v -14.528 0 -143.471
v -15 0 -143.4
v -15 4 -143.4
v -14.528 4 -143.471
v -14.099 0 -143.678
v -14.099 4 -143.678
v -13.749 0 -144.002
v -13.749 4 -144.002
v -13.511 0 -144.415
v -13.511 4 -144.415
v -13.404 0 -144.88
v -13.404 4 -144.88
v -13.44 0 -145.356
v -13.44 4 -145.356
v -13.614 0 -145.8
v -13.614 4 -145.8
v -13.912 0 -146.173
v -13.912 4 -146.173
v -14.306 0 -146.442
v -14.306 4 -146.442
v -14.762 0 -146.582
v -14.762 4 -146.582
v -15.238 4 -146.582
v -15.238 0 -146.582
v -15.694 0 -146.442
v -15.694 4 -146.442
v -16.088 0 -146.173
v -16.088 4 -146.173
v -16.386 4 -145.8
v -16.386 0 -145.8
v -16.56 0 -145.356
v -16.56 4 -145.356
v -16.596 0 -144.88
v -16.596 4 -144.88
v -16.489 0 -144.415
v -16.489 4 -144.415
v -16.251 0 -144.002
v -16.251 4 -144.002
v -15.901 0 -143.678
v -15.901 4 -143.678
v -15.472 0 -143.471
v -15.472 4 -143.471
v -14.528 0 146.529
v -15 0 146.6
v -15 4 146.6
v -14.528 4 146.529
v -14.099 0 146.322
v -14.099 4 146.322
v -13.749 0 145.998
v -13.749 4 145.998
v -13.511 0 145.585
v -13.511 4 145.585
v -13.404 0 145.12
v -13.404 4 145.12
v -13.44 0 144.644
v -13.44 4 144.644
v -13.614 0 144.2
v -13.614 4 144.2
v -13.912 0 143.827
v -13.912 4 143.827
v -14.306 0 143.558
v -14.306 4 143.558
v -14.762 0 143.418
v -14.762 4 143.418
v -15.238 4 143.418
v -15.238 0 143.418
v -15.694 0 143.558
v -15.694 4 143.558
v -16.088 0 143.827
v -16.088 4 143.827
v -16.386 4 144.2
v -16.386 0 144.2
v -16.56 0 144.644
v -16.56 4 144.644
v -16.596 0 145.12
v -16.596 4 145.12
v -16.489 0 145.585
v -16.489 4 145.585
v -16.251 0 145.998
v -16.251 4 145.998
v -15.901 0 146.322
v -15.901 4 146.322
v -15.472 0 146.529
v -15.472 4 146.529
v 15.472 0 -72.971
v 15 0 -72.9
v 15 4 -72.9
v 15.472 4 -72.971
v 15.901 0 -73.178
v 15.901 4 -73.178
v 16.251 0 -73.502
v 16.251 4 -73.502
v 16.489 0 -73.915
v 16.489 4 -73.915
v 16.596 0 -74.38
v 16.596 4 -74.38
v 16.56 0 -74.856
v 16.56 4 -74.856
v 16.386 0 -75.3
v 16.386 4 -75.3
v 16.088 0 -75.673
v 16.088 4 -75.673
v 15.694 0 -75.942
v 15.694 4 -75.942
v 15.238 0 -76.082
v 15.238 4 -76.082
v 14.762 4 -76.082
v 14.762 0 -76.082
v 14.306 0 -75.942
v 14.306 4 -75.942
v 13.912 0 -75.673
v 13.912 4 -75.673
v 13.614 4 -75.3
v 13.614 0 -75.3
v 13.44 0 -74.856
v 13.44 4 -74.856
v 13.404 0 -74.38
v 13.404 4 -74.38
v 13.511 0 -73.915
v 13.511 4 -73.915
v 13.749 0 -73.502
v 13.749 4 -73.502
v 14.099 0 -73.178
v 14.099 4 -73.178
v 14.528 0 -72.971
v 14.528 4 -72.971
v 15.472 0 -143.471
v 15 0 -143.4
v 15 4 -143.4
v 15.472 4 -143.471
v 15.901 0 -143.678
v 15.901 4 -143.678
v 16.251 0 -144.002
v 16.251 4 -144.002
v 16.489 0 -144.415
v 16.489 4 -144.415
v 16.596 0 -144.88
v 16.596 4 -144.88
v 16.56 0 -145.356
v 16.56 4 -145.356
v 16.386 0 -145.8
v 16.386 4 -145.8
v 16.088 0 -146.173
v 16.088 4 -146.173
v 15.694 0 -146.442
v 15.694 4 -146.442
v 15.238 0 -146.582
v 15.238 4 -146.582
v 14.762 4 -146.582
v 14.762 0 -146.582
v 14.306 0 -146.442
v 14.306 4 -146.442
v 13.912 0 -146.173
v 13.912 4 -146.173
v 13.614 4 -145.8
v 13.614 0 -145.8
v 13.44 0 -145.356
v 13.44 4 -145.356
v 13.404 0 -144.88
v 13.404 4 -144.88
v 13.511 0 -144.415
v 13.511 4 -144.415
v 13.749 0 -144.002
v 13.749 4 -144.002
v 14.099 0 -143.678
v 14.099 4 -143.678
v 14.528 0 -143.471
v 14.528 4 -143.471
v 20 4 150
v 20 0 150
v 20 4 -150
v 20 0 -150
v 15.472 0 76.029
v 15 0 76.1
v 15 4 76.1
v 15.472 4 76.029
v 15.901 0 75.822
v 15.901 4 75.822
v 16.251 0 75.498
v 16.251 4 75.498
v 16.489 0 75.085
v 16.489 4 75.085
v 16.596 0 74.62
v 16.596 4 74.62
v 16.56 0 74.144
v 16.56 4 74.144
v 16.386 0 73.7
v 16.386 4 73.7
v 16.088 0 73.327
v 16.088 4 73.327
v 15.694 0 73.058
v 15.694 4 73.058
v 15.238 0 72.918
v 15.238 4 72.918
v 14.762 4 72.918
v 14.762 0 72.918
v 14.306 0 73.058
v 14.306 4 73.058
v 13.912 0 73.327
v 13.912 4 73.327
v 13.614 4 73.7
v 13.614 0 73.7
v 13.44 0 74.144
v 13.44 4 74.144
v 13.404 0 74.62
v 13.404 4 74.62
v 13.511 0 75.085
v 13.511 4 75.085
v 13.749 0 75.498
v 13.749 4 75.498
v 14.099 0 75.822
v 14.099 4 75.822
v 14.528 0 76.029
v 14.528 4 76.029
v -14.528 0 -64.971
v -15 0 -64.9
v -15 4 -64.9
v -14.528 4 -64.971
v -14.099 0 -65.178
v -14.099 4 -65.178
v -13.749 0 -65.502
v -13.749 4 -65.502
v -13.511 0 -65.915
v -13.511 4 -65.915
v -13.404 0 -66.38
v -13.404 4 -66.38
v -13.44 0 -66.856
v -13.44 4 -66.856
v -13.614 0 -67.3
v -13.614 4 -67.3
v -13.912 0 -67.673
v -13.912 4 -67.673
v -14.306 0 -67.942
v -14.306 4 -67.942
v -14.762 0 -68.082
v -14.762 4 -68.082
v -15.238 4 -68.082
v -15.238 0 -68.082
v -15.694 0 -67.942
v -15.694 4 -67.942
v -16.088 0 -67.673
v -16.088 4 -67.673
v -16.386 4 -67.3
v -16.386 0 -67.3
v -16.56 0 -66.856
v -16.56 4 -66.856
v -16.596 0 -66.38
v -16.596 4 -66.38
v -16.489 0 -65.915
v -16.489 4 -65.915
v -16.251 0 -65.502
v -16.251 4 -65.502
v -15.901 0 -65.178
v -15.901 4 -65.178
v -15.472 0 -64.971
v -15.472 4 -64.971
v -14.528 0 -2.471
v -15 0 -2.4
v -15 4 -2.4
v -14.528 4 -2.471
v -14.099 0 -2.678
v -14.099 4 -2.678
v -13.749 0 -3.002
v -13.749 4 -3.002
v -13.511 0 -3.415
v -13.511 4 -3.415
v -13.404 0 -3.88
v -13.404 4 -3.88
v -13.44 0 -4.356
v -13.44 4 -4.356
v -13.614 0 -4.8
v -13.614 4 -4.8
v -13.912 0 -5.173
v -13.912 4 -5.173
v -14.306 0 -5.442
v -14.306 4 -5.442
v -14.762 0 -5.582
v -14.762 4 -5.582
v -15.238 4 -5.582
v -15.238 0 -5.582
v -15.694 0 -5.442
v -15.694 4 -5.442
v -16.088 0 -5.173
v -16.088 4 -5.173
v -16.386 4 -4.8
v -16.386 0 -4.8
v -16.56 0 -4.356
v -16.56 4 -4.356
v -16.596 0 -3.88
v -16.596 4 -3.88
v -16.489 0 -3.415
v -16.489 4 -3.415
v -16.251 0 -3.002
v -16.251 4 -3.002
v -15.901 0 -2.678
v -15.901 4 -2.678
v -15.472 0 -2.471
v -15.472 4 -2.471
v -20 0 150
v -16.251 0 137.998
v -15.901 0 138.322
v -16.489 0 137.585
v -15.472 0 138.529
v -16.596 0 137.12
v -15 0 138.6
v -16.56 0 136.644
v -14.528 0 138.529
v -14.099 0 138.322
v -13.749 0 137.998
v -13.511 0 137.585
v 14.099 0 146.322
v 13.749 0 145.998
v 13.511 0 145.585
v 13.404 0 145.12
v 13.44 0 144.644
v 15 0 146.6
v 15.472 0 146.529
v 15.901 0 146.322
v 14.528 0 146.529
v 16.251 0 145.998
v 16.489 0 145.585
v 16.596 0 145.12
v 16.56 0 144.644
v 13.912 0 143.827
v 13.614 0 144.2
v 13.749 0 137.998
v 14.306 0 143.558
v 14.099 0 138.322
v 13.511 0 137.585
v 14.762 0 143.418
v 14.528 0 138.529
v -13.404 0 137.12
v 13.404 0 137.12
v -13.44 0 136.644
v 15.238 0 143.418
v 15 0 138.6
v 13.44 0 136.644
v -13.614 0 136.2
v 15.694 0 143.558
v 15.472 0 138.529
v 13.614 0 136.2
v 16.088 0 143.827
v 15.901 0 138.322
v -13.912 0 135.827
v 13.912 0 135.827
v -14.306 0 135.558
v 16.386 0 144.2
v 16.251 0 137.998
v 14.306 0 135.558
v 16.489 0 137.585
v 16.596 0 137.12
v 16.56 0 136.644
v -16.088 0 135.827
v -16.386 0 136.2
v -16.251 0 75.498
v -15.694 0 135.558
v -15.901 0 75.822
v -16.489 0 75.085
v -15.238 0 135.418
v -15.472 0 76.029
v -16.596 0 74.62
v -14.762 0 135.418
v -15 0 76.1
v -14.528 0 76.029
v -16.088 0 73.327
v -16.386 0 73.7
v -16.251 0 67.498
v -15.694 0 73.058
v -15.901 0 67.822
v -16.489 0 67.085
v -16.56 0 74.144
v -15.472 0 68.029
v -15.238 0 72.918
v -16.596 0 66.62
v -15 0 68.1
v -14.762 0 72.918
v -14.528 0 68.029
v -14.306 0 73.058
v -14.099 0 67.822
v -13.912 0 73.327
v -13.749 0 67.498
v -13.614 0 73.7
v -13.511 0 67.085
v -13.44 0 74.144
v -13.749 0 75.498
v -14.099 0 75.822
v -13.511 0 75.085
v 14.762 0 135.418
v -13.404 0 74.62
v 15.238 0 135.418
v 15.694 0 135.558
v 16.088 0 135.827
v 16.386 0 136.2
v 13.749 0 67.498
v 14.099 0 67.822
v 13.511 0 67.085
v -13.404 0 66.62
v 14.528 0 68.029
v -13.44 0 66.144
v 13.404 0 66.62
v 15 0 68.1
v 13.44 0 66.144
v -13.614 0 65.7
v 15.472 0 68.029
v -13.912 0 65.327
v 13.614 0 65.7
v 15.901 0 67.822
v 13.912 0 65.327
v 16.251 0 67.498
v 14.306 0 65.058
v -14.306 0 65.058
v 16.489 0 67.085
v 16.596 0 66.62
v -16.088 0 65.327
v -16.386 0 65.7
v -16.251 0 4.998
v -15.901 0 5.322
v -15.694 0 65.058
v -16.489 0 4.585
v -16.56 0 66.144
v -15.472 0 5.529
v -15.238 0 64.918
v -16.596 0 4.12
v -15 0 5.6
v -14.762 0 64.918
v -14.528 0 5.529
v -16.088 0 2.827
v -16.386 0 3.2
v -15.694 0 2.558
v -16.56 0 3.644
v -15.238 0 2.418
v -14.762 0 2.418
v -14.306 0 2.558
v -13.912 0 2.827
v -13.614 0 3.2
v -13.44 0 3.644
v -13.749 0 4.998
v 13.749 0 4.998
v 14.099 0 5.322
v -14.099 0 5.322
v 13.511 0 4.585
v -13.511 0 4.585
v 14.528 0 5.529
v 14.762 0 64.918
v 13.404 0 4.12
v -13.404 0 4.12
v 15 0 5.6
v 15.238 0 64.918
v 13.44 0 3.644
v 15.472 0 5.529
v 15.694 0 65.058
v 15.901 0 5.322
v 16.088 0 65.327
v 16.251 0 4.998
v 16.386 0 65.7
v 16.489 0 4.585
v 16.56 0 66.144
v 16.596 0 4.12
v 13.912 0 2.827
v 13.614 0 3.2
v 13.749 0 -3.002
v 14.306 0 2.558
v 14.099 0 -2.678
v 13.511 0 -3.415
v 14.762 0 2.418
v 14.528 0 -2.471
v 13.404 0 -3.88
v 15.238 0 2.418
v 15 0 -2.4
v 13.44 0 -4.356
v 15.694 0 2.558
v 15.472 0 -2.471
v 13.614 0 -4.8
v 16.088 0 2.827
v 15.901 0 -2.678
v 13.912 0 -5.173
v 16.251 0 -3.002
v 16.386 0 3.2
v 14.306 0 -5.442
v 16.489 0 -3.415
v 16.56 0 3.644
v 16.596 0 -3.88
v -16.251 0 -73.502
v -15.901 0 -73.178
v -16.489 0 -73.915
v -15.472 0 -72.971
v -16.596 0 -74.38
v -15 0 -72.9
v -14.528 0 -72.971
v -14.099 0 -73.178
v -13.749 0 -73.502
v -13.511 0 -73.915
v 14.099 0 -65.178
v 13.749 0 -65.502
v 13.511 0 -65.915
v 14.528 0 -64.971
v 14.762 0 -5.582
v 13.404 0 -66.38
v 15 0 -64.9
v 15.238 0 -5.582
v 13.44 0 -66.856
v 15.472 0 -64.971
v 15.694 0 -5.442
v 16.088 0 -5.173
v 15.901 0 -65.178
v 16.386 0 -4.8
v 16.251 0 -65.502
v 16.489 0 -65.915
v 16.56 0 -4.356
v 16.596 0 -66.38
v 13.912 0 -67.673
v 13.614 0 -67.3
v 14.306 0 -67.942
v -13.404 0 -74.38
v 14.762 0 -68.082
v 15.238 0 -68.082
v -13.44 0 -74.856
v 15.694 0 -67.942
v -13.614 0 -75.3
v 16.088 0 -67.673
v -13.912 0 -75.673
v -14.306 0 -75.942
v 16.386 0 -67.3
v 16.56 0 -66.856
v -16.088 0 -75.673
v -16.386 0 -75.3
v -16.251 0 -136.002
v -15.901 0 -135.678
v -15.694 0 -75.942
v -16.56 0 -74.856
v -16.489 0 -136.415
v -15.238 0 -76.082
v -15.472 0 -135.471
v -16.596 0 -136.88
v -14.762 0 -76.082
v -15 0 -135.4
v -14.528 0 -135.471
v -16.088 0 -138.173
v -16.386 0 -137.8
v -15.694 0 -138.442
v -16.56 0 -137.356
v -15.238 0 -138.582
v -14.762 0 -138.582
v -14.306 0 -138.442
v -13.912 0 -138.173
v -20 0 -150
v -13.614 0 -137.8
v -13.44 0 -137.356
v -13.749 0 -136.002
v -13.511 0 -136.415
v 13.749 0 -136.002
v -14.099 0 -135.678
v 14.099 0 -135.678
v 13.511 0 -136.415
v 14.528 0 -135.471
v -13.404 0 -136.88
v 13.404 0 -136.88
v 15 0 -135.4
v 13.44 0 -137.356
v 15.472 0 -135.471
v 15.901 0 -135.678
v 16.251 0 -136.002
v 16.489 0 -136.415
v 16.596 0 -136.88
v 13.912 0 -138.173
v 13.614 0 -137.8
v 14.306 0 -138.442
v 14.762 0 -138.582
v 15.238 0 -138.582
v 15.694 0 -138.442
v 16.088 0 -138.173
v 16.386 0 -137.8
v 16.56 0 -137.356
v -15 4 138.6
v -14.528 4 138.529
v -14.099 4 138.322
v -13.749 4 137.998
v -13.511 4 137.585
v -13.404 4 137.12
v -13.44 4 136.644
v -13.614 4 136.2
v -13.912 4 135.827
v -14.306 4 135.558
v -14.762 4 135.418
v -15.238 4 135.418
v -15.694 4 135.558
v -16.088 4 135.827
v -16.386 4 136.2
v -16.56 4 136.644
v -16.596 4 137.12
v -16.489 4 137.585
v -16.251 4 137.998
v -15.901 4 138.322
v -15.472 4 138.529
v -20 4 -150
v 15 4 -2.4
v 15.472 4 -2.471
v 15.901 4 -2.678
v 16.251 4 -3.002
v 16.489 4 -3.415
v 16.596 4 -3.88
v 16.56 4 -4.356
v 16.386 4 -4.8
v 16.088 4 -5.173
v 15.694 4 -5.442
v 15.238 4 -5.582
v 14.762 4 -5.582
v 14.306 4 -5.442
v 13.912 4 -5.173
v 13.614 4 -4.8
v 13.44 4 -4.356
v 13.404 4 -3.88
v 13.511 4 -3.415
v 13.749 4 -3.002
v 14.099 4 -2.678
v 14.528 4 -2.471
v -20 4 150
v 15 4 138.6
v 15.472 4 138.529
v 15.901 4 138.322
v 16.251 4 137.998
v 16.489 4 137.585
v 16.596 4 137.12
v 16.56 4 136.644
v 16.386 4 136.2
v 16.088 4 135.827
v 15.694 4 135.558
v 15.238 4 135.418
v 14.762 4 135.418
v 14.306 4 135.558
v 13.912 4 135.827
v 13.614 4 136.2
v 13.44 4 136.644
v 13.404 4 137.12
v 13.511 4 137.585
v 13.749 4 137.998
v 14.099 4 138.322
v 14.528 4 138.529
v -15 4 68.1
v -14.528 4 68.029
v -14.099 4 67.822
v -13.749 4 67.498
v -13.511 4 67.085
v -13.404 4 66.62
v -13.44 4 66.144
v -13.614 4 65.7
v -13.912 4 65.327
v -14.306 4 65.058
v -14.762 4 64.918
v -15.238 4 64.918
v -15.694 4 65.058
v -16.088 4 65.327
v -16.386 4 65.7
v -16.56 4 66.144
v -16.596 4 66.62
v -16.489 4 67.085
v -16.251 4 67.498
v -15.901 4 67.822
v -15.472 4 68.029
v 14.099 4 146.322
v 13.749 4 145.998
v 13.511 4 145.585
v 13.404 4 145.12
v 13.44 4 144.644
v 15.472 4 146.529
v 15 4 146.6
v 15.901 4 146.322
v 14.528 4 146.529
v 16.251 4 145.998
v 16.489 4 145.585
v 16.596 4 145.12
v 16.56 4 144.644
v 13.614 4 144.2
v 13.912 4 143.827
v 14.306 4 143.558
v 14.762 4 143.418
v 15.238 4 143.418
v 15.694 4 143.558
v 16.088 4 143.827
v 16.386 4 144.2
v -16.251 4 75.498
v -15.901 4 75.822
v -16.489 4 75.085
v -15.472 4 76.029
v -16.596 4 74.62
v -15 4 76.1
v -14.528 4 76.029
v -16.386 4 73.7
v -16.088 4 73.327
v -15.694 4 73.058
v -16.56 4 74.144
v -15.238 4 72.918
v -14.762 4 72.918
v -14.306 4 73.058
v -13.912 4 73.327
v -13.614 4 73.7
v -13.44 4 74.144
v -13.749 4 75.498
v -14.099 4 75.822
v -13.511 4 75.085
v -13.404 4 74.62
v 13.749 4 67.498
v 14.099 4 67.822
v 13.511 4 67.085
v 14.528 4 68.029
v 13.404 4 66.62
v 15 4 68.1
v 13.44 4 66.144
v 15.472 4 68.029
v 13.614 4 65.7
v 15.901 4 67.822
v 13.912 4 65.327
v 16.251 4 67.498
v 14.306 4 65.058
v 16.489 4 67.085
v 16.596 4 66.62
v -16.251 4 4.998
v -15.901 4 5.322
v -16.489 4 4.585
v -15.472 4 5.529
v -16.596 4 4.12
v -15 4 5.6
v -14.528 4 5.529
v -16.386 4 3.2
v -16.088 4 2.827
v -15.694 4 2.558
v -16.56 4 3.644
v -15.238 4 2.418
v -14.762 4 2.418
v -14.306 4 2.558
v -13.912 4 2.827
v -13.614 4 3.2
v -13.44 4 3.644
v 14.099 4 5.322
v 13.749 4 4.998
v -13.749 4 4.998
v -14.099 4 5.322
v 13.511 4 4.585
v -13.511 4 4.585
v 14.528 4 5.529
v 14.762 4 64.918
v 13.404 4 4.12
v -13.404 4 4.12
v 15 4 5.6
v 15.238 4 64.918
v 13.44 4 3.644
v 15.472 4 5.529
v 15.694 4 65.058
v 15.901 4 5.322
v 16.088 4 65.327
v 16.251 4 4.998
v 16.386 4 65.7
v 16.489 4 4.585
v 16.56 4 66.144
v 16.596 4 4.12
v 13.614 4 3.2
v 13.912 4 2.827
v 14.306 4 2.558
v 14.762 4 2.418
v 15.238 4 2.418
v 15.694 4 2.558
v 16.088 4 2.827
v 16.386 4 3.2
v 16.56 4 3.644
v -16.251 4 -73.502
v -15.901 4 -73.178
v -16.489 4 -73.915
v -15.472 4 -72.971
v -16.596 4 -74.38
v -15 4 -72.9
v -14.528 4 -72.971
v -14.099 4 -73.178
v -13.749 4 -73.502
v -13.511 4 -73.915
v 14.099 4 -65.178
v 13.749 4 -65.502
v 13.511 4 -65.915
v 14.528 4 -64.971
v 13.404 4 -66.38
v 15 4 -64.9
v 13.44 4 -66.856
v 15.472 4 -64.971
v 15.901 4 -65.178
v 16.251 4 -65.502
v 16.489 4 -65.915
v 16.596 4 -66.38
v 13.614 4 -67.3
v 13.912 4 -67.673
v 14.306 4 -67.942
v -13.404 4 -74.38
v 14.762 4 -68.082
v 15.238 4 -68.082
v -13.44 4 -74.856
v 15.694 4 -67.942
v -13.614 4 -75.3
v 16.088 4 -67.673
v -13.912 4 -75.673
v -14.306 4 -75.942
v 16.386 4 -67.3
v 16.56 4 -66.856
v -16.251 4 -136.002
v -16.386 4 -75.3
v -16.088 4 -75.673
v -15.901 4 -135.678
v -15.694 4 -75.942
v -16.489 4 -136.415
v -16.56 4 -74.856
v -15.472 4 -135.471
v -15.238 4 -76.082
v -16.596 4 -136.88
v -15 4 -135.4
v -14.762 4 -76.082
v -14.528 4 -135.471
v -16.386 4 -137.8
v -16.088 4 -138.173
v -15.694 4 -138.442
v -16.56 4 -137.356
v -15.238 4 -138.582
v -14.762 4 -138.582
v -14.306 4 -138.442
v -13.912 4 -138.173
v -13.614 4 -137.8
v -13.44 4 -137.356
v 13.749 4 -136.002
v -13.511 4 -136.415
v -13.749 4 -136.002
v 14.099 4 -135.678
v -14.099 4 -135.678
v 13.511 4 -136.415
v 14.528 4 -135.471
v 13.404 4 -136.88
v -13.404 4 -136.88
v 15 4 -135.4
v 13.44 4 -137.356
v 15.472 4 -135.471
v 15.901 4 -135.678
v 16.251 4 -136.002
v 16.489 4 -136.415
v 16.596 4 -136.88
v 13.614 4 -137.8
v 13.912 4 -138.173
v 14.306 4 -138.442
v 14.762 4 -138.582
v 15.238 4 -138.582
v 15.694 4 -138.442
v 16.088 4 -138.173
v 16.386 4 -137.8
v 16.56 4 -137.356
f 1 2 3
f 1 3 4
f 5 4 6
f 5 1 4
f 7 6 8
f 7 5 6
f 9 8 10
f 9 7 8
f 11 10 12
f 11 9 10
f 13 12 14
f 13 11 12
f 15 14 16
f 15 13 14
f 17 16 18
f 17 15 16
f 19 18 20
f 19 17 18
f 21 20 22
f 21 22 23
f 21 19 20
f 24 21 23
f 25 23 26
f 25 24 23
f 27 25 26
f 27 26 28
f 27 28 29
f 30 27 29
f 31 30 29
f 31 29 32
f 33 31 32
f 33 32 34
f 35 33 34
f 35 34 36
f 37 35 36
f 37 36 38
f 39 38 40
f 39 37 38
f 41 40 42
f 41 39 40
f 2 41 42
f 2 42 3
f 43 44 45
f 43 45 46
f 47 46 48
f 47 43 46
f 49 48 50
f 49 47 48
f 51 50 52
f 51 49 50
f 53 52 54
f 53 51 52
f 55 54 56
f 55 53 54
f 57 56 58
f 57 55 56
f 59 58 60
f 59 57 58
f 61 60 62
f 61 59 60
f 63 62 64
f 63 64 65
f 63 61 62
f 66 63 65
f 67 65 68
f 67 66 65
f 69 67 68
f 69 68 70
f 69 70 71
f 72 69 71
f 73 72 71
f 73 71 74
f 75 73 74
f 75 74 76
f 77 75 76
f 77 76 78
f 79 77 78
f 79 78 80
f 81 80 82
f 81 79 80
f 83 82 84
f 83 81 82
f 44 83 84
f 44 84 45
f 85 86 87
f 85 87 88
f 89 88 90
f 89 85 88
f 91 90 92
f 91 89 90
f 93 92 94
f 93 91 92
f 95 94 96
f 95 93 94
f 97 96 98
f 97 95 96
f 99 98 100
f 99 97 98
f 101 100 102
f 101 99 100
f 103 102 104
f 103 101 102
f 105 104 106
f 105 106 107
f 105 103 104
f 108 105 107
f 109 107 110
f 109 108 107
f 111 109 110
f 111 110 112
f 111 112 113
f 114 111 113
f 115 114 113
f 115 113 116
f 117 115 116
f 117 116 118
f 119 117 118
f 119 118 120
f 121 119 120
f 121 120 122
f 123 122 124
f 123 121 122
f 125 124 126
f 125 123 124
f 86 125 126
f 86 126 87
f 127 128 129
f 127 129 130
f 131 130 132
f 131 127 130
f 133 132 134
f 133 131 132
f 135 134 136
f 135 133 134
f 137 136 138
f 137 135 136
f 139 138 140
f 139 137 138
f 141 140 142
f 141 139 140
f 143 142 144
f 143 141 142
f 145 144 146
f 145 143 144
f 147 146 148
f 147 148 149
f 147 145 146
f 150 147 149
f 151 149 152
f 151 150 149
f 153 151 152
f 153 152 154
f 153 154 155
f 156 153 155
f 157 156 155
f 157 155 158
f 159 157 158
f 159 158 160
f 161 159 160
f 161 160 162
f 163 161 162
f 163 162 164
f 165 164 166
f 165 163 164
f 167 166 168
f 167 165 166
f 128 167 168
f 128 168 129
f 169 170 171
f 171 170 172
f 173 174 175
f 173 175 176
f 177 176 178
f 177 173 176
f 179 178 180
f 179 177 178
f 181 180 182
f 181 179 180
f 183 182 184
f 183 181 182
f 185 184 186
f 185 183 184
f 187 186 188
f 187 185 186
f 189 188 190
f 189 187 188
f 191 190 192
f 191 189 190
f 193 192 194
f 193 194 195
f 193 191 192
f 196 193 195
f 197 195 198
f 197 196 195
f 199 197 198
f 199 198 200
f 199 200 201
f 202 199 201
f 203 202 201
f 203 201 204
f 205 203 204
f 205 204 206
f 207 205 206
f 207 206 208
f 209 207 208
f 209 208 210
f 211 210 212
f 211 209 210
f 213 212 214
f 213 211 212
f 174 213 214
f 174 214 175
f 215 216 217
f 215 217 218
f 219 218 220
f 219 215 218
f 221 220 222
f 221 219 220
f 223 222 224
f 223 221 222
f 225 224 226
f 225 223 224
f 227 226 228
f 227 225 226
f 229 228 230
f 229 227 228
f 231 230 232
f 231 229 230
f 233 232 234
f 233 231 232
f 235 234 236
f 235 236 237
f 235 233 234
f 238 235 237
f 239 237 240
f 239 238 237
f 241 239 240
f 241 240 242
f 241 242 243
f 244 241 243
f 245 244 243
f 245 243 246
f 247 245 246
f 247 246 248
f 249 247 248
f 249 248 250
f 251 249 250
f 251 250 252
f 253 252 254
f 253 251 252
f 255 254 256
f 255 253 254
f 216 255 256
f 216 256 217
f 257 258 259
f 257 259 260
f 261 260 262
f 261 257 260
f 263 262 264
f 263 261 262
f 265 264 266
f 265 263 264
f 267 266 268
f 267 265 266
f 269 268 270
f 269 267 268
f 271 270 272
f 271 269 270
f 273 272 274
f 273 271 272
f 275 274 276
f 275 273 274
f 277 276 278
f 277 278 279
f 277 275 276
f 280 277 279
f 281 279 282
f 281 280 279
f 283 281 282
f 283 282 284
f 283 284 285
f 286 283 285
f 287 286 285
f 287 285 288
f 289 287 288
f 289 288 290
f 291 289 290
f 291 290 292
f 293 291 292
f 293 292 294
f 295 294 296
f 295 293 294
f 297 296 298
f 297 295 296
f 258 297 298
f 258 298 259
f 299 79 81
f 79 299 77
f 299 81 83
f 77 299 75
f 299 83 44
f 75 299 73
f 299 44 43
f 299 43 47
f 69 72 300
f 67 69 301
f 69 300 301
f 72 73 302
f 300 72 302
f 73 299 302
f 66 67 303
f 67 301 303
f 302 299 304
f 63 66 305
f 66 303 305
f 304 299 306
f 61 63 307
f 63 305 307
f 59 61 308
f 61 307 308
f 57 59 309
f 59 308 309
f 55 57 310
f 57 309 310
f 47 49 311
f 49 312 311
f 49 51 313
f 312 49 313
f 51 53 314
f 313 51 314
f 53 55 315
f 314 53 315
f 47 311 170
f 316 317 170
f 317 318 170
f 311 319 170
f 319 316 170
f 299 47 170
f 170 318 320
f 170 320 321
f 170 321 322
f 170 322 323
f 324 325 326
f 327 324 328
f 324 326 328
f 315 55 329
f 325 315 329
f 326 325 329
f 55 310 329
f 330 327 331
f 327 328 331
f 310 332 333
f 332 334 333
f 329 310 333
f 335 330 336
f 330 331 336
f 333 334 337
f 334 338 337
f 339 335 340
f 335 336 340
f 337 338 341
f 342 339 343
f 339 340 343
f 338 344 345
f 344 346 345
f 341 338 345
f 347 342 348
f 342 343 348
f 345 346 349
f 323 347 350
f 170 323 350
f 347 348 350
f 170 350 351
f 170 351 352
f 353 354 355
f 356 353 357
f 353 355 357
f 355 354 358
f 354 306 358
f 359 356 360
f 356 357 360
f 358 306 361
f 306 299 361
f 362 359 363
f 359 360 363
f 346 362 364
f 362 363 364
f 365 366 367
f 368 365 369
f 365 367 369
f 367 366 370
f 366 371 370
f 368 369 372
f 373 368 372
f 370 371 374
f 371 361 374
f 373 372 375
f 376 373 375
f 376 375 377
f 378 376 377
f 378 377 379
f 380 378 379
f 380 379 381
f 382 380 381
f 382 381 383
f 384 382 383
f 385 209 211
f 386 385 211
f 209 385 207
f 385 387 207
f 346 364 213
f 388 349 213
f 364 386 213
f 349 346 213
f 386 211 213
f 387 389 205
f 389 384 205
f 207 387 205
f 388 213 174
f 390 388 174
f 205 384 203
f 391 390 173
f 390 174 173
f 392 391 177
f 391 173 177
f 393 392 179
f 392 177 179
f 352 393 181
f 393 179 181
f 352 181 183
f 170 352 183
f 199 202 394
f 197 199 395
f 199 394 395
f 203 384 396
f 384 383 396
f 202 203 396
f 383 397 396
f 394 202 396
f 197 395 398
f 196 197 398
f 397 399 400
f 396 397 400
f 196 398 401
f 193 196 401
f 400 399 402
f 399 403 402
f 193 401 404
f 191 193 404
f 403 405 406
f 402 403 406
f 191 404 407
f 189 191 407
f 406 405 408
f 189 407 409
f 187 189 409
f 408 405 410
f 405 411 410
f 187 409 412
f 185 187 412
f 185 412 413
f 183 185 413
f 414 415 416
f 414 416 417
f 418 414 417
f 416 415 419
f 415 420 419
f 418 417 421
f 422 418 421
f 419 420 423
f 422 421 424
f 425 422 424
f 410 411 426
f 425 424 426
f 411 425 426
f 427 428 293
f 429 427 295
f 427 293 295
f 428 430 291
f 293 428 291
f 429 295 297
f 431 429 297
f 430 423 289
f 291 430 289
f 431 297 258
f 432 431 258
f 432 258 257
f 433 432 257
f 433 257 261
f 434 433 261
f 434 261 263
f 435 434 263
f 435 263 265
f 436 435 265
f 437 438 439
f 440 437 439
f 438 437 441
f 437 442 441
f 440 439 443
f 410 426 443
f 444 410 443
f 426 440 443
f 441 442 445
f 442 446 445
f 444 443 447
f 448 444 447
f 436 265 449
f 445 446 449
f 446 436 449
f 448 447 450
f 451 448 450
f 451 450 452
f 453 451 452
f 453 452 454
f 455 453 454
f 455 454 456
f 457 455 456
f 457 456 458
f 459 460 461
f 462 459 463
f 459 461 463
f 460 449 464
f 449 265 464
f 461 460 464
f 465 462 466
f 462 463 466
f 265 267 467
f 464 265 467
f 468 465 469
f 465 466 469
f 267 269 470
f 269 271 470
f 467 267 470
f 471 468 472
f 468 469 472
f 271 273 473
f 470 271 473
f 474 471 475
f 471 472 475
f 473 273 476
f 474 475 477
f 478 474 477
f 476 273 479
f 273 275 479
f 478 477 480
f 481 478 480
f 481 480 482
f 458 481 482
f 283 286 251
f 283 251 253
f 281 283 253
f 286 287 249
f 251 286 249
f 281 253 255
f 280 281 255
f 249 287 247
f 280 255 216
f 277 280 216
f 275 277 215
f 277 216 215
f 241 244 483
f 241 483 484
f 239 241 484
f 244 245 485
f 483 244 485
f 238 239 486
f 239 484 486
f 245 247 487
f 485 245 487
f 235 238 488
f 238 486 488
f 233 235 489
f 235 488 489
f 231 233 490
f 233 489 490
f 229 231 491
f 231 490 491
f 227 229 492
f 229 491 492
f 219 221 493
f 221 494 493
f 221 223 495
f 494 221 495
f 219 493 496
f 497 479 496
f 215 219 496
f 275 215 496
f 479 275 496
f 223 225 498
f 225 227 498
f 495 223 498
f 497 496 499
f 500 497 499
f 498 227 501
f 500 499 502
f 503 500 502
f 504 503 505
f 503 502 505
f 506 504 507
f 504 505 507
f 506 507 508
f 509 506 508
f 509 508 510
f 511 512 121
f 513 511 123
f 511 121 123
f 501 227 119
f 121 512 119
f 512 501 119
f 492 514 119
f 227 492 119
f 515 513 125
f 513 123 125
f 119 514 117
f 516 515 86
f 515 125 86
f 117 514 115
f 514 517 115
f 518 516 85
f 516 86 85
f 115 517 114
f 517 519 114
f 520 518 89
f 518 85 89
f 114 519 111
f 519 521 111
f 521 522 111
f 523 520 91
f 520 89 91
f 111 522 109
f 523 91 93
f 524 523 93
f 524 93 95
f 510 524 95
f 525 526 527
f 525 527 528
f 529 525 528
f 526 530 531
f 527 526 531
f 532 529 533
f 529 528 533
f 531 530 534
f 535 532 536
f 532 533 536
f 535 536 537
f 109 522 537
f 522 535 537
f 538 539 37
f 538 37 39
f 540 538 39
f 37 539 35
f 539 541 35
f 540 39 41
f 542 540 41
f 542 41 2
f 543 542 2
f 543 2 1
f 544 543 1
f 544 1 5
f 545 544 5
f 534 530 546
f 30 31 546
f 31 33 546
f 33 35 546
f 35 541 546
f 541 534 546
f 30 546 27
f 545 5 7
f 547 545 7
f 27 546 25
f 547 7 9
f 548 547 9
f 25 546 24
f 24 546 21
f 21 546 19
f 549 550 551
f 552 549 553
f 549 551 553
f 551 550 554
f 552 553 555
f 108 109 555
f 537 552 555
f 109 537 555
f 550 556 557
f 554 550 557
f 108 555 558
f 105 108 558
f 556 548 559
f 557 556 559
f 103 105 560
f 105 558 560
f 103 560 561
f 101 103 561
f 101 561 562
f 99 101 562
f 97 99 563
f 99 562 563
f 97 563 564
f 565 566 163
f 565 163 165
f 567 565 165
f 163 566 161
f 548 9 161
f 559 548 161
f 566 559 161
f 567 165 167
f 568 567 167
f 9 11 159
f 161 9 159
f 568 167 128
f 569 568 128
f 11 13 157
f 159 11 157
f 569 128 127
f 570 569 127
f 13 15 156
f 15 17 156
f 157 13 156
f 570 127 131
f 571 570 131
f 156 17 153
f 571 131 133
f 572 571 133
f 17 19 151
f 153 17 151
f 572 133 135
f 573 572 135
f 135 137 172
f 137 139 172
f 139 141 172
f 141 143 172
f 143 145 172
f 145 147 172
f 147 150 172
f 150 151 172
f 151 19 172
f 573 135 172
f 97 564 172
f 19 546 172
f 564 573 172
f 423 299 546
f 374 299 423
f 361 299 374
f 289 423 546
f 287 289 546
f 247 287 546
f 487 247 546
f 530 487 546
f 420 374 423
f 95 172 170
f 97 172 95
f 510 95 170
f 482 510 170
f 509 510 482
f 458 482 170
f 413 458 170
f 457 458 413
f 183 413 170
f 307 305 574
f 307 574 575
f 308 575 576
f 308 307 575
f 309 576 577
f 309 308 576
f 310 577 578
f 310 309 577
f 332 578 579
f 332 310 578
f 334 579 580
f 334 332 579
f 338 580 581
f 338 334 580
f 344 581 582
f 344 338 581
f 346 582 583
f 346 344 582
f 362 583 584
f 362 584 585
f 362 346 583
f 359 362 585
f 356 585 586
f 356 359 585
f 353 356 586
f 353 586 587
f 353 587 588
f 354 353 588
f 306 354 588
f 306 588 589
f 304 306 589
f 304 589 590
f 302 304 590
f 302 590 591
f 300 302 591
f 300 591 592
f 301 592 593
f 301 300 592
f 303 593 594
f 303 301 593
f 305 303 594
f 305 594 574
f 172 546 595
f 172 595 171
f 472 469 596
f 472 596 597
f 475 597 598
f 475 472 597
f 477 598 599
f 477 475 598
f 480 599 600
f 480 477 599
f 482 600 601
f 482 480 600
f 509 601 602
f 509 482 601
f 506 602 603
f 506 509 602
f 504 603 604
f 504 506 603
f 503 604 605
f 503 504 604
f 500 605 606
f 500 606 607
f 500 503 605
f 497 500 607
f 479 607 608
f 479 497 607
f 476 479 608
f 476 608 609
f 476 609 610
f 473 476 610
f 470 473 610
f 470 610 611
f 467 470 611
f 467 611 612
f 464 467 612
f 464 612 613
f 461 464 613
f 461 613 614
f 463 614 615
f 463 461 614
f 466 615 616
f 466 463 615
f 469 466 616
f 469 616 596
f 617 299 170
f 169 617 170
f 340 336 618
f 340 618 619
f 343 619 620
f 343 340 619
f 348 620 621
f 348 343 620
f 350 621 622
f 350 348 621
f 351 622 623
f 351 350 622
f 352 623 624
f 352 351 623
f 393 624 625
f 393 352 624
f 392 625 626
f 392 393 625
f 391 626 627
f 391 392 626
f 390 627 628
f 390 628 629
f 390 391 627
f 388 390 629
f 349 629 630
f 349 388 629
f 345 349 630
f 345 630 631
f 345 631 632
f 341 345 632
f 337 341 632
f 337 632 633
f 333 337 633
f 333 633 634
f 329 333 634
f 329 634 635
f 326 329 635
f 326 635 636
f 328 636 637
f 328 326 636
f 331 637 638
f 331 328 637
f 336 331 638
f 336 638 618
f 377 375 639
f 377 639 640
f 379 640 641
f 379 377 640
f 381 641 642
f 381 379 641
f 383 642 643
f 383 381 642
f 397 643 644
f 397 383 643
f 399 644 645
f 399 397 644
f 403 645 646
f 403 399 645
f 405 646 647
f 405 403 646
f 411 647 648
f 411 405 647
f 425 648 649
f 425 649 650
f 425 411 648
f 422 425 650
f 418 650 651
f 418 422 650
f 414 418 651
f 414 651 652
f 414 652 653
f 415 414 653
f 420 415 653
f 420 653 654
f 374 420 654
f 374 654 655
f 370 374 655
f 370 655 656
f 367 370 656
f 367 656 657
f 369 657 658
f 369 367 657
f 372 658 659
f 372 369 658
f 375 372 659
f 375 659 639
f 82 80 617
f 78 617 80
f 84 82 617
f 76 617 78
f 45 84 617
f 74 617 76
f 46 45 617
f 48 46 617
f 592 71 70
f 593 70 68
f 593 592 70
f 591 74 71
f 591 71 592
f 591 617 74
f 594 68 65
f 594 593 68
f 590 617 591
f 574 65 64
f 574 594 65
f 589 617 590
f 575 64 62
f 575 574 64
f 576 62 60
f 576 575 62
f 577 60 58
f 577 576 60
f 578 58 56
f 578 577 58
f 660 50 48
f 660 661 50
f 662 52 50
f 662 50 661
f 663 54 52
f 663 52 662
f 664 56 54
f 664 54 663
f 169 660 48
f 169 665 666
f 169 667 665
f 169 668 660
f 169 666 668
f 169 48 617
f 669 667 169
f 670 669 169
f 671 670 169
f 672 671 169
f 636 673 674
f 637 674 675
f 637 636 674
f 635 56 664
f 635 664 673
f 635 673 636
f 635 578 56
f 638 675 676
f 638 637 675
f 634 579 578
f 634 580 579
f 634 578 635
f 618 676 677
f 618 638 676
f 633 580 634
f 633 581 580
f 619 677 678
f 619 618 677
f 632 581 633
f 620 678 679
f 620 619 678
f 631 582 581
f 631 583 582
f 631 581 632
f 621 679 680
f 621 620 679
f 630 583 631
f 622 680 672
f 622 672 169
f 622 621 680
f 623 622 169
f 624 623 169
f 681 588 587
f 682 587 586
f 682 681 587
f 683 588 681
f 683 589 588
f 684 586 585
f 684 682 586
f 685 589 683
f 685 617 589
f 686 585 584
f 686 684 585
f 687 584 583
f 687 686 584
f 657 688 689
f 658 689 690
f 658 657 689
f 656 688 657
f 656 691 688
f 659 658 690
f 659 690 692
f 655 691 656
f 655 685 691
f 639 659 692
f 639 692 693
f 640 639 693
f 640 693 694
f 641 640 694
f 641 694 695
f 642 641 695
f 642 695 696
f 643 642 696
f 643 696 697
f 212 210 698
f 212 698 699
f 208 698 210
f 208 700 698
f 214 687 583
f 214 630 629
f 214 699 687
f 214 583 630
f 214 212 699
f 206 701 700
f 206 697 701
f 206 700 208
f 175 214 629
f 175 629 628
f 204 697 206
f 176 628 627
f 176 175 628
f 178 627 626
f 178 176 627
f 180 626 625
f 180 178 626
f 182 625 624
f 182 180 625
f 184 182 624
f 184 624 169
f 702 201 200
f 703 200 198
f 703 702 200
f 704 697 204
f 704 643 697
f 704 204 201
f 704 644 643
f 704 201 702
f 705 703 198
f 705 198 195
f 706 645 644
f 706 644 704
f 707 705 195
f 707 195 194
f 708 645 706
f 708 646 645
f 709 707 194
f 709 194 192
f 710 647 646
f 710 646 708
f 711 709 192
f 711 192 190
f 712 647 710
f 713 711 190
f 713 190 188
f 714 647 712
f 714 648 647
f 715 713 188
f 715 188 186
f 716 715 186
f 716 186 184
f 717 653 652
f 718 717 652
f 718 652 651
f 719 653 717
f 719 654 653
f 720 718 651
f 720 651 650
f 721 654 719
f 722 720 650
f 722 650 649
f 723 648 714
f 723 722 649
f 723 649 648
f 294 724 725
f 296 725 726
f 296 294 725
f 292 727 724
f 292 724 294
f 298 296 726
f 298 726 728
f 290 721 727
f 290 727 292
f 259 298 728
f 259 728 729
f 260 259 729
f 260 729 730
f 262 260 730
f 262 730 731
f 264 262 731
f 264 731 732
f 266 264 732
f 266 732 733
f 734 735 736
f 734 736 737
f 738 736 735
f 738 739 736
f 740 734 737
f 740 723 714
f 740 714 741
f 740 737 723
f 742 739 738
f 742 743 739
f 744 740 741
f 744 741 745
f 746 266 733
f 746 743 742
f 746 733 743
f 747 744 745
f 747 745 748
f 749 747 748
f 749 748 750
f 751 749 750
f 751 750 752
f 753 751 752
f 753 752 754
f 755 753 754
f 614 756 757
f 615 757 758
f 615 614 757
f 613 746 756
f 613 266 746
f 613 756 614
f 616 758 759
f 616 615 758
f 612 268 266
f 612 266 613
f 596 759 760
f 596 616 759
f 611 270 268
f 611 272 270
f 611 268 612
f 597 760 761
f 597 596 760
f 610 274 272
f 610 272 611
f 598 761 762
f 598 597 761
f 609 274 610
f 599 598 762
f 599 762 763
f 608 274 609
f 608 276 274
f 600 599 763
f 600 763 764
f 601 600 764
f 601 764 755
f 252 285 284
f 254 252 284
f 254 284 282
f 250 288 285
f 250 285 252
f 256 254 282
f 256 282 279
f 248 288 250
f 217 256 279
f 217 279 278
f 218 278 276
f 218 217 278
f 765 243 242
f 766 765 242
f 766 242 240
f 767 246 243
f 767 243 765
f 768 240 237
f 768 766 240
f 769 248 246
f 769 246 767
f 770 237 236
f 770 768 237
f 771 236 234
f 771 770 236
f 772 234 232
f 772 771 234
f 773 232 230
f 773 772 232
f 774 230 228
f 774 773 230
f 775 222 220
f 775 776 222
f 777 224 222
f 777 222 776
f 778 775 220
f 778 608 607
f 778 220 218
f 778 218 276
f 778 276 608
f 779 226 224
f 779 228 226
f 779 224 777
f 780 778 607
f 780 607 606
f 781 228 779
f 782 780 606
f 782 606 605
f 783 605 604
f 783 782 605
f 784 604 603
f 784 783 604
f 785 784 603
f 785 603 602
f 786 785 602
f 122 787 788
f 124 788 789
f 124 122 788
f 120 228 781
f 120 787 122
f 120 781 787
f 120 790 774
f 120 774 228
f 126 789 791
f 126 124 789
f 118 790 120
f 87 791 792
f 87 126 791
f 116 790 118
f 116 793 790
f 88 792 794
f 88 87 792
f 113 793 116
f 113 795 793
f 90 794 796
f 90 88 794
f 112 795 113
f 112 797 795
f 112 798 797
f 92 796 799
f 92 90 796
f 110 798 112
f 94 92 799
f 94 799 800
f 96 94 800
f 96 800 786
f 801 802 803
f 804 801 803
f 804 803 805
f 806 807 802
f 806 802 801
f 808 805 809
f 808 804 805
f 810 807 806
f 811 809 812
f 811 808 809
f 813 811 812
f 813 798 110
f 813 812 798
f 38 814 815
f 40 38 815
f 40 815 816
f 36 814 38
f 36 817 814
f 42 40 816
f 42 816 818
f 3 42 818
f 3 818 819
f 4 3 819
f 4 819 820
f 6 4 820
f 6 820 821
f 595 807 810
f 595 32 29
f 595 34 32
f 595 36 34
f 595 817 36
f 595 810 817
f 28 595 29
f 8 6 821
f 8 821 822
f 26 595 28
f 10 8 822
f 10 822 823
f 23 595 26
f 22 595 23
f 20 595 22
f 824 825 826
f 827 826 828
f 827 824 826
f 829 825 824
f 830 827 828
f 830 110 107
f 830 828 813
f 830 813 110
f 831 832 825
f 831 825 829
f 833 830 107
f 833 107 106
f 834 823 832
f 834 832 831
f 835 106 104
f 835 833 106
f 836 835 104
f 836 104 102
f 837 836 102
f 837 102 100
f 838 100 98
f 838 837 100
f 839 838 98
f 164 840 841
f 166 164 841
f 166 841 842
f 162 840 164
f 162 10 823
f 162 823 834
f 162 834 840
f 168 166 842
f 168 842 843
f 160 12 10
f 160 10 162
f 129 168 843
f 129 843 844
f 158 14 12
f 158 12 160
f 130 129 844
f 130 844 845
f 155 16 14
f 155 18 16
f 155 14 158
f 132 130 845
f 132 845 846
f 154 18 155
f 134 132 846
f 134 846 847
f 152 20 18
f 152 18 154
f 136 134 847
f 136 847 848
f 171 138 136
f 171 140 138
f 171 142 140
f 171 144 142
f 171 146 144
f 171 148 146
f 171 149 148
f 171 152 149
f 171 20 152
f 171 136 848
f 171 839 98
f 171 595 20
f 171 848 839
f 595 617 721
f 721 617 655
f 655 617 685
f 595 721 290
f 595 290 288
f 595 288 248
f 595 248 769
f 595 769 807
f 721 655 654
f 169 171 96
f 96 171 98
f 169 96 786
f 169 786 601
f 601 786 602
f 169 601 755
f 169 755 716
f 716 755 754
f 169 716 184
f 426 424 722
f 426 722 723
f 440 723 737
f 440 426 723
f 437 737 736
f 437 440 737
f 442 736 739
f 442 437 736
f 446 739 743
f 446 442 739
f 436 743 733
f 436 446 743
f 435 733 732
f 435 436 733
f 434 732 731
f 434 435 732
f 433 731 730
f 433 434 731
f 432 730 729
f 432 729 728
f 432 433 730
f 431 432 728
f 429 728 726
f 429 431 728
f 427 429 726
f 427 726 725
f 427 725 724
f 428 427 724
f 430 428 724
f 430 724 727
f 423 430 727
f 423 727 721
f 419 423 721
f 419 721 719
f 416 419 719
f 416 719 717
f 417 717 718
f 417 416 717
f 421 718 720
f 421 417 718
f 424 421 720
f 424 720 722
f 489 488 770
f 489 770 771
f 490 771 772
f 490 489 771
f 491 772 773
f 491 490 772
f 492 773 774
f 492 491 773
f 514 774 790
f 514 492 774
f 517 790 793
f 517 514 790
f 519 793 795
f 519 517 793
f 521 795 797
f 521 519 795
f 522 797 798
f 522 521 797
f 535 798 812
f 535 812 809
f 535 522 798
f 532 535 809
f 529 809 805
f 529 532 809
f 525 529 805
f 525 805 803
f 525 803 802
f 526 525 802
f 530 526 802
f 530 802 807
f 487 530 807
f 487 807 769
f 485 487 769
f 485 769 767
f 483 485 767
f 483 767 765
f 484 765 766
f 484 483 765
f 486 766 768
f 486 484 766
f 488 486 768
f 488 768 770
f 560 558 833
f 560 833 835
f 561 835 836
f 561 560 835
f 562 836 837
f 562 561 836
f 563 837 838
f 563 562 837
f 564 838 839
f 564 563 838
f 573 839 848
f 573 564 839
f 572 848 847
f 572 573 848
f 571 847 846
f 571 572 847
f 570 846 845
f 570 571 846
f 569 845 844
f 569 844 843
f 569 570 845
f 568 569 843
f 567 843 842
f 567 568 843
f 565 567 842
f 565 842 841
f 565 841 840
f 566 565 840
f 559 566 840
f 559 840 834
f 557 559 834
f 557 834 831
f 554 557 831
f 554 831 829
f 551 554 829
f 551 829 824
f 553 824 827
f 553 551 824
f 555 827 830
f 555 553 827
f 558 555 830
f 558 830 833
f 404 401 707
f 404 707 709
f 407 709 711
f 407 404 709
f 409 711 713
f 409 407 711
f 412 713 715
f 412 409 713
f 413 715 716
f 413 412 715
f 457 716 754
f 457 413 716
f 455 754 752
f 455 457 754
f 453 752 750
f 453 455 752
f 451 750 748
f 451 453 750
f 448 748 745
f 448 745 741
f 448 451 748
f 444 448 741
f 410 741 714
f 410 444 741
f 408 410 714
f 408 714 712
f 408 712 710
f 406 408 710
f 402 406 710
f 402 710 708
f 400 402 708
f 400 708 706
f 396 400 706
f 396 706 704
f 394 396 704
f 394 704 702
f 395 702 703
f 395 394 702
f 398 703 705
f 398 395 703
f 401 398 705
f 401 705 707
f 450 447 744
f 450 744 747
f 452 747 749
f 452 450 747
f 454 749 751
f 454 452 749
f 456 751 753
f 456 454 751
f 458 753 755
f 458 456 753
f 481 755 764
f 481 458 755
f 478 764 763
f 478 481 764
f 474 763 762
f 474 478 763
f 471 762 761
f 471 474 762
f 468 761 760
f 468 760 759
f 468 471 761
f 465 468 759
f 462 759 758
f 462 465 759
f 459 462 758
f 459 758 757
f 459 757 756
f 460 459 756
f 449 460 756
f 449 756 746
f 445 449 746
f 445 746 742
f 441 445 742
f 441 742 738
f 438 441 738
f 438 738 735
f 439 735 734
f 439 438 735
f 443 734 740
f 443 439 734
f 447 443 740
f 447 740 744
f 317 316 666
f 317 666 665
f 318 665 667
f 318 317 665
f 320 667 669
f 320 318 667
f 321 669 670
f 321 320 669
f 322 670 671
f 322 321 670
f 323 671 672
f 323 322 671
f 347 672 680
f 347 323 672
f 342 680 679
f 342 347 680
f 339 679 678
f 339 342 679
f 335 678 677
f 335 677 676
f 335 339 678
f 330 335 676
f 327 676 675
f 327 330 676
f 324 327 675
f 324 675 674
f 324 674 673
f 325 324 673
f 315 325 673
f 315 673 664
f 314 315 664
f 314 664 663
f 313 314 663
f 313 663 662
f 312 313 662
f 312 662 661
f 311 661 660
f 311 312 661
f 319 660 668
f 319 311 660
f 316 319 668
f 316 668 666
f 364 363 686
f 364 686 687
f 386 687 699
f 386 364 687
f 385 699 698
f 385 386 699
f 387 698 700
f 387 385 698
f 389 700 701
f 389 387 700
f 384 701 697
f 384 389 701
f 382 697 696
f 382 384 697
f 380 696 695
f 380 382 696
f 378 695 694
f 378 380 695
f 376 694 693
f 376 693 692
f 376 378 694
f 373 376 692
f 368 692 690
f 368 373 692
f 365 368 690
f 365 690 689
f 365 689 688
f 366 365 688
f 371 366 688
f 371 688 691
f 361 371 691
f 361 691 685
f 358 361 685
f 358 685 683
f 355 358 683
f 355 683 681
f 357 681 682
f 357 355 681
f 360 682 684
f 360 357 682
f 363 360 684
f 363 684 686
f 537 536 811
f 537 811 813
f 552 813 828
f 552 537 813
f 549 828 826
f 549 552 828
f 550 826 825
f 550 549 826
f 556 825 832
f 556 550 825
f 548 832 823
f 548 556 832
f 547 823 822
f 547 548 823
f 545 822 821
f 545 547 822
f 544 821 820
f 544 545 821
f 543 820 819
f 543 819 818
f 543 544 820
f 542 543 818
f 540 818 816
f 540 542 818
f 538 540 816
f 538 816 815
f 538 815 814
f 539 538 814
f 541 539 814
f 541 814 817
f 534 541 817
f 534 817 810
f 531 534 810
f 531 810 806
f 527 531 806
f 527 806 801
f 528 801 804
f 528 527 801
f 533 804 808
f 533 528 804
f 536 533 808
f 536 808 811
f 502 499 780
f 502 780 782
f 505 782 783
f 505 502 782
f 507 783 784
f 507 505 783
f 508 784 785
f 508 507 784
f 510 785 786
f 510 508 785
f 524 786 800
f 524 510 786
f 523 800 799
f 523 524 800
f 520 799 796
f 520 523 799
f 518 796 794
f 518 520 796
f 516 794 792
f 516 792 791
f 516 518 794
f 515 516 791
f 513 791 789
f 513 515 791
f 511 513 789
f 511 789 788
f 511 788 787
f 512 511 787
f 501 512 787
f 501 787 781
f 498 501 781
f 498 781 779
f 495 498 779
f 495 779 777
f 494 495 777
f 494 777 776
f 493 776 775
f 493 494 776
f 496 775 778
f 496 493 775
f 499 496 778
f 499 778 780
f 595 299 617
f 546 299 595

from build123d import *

# Parameters (mm, degrees)
SKETCH_1_W      = 40
SKETCH_1_H      = 300
SKETCH_1_R      = 1.6
EXTRUDE_1_DEPTH = 4


with BuildPart() as part:
    # 草图1 → 凸台-拉伸1 (new body)
    with BuildSketch(Plane(origin=(0, 0, 0), x_dir=(1, 0, 0), z_dir=(0, 1, 0))):
        Rectangle(SKETCH_1_W, SKETCH_1_H)
        with Locations(Location((-15, 145, 0), (0, 0, 270))):
            Circle(SKETCH_1_R, mode=Mode.SUBTRACT)
        with Locations(Location((-15, 137, 0), (0, 0, 270))):
            Circle(SKETCH_1_R, mode=Mode.SUBTRACT)
        with Locations(Location((15, 145, 0), (0, 0, 270))):
            Circle(SKETCH_1_R, mode=Mode.SUBTRACT)
        with Locations(Location((15, 137, 0), (0, 0, 270))):
            Circle(SKETCH_1_R, mode=Mode.SUBTRACT)
        with Locations(Location((15, 74.5, 0), (0, 0, 270))):
            Circle(SKETCH_1_R, mode=Mode.SUBTRACT)
        with Locations(Location((15, 66.5, 0), (0, 0, 270))):
            Circle(SKETCH_1_R, mode=Mode.SUBTRACT)
        with Locations(Location((15, 4, 0), (0, 0, 270))):
            Circle(SKETCH_1_R, mode=Mode.SUBTRACT)
        with Locations(Location((15, -4, 0), (0, 0, 270))):
            Circle(SKETCH_1_R, mode=Mode.SUBTRACT)
        with Locations(Location((15, -66.5, 0), (0, 0, 270))):
            Circle(SKETCH_1_R, mode=Mode.SUBTRACT)
        with Locations(Location((15, -74.5, 0), (0, 0, 270))):
            Circle(SKETCH_1_R, mode=Mode.SUBTRACT)
        with Locations(Location((15, -137, 0), (0, 0, 270))):
            Circle(SKETCH_1_R, mode=Mode.SUBTRACT)
        with Locations(Location((15, -145, 0), (0, 0, 270))):
            Circle(SKETCH_1_R, mode=Mode.SUBTRACT)
        with Locations(Location((-15, 74.5, 0), (0, 0, 270))):
            Circle(SKETCH_1_R, mode=Mode.SUBTRACT)
        with Locations(Location((-15, 66.5, 0), (0, 0, 270))):
            Circle(SKETCH_1_R, mode=Mode.SUBTRACT)
        with Locations(Location((-15, 4, 0), (0, 0, 270))):
            Circle(SKETCH_1_R, mode=Mode.SUBTRACT)
        with Locations(Location((-15, -4, 0), (0, 0, 270))):
            Circle(SKETCH_1_R, mode=Mode.SUBTRACT)
        with Locations(Location((-15, -66.5, 0), (0, 0, 270))):
            Circle(SKETCH_1_R, mode=Mode.SUBTRACT)
        with Locations(Location((-15, -74.5, 0), (0, 0, 270))):
            Circle(SKETCH_1_R, mode=Mode.SUBTRACT)
        with Locations(Location((-15, -137, 0), (0, 0, 270))):
            Circle(SKETCH_1_R, mode=Mode.SUBTRACT)
        with Locations(Location((-15, -145, 0), (0, 0, 270))):
            Circle(SKETCH_1_R, mode=Mode.SUBTRACT)
    extrude(amount=EXTRUDE_1_DEPTH)


solid = part.part
